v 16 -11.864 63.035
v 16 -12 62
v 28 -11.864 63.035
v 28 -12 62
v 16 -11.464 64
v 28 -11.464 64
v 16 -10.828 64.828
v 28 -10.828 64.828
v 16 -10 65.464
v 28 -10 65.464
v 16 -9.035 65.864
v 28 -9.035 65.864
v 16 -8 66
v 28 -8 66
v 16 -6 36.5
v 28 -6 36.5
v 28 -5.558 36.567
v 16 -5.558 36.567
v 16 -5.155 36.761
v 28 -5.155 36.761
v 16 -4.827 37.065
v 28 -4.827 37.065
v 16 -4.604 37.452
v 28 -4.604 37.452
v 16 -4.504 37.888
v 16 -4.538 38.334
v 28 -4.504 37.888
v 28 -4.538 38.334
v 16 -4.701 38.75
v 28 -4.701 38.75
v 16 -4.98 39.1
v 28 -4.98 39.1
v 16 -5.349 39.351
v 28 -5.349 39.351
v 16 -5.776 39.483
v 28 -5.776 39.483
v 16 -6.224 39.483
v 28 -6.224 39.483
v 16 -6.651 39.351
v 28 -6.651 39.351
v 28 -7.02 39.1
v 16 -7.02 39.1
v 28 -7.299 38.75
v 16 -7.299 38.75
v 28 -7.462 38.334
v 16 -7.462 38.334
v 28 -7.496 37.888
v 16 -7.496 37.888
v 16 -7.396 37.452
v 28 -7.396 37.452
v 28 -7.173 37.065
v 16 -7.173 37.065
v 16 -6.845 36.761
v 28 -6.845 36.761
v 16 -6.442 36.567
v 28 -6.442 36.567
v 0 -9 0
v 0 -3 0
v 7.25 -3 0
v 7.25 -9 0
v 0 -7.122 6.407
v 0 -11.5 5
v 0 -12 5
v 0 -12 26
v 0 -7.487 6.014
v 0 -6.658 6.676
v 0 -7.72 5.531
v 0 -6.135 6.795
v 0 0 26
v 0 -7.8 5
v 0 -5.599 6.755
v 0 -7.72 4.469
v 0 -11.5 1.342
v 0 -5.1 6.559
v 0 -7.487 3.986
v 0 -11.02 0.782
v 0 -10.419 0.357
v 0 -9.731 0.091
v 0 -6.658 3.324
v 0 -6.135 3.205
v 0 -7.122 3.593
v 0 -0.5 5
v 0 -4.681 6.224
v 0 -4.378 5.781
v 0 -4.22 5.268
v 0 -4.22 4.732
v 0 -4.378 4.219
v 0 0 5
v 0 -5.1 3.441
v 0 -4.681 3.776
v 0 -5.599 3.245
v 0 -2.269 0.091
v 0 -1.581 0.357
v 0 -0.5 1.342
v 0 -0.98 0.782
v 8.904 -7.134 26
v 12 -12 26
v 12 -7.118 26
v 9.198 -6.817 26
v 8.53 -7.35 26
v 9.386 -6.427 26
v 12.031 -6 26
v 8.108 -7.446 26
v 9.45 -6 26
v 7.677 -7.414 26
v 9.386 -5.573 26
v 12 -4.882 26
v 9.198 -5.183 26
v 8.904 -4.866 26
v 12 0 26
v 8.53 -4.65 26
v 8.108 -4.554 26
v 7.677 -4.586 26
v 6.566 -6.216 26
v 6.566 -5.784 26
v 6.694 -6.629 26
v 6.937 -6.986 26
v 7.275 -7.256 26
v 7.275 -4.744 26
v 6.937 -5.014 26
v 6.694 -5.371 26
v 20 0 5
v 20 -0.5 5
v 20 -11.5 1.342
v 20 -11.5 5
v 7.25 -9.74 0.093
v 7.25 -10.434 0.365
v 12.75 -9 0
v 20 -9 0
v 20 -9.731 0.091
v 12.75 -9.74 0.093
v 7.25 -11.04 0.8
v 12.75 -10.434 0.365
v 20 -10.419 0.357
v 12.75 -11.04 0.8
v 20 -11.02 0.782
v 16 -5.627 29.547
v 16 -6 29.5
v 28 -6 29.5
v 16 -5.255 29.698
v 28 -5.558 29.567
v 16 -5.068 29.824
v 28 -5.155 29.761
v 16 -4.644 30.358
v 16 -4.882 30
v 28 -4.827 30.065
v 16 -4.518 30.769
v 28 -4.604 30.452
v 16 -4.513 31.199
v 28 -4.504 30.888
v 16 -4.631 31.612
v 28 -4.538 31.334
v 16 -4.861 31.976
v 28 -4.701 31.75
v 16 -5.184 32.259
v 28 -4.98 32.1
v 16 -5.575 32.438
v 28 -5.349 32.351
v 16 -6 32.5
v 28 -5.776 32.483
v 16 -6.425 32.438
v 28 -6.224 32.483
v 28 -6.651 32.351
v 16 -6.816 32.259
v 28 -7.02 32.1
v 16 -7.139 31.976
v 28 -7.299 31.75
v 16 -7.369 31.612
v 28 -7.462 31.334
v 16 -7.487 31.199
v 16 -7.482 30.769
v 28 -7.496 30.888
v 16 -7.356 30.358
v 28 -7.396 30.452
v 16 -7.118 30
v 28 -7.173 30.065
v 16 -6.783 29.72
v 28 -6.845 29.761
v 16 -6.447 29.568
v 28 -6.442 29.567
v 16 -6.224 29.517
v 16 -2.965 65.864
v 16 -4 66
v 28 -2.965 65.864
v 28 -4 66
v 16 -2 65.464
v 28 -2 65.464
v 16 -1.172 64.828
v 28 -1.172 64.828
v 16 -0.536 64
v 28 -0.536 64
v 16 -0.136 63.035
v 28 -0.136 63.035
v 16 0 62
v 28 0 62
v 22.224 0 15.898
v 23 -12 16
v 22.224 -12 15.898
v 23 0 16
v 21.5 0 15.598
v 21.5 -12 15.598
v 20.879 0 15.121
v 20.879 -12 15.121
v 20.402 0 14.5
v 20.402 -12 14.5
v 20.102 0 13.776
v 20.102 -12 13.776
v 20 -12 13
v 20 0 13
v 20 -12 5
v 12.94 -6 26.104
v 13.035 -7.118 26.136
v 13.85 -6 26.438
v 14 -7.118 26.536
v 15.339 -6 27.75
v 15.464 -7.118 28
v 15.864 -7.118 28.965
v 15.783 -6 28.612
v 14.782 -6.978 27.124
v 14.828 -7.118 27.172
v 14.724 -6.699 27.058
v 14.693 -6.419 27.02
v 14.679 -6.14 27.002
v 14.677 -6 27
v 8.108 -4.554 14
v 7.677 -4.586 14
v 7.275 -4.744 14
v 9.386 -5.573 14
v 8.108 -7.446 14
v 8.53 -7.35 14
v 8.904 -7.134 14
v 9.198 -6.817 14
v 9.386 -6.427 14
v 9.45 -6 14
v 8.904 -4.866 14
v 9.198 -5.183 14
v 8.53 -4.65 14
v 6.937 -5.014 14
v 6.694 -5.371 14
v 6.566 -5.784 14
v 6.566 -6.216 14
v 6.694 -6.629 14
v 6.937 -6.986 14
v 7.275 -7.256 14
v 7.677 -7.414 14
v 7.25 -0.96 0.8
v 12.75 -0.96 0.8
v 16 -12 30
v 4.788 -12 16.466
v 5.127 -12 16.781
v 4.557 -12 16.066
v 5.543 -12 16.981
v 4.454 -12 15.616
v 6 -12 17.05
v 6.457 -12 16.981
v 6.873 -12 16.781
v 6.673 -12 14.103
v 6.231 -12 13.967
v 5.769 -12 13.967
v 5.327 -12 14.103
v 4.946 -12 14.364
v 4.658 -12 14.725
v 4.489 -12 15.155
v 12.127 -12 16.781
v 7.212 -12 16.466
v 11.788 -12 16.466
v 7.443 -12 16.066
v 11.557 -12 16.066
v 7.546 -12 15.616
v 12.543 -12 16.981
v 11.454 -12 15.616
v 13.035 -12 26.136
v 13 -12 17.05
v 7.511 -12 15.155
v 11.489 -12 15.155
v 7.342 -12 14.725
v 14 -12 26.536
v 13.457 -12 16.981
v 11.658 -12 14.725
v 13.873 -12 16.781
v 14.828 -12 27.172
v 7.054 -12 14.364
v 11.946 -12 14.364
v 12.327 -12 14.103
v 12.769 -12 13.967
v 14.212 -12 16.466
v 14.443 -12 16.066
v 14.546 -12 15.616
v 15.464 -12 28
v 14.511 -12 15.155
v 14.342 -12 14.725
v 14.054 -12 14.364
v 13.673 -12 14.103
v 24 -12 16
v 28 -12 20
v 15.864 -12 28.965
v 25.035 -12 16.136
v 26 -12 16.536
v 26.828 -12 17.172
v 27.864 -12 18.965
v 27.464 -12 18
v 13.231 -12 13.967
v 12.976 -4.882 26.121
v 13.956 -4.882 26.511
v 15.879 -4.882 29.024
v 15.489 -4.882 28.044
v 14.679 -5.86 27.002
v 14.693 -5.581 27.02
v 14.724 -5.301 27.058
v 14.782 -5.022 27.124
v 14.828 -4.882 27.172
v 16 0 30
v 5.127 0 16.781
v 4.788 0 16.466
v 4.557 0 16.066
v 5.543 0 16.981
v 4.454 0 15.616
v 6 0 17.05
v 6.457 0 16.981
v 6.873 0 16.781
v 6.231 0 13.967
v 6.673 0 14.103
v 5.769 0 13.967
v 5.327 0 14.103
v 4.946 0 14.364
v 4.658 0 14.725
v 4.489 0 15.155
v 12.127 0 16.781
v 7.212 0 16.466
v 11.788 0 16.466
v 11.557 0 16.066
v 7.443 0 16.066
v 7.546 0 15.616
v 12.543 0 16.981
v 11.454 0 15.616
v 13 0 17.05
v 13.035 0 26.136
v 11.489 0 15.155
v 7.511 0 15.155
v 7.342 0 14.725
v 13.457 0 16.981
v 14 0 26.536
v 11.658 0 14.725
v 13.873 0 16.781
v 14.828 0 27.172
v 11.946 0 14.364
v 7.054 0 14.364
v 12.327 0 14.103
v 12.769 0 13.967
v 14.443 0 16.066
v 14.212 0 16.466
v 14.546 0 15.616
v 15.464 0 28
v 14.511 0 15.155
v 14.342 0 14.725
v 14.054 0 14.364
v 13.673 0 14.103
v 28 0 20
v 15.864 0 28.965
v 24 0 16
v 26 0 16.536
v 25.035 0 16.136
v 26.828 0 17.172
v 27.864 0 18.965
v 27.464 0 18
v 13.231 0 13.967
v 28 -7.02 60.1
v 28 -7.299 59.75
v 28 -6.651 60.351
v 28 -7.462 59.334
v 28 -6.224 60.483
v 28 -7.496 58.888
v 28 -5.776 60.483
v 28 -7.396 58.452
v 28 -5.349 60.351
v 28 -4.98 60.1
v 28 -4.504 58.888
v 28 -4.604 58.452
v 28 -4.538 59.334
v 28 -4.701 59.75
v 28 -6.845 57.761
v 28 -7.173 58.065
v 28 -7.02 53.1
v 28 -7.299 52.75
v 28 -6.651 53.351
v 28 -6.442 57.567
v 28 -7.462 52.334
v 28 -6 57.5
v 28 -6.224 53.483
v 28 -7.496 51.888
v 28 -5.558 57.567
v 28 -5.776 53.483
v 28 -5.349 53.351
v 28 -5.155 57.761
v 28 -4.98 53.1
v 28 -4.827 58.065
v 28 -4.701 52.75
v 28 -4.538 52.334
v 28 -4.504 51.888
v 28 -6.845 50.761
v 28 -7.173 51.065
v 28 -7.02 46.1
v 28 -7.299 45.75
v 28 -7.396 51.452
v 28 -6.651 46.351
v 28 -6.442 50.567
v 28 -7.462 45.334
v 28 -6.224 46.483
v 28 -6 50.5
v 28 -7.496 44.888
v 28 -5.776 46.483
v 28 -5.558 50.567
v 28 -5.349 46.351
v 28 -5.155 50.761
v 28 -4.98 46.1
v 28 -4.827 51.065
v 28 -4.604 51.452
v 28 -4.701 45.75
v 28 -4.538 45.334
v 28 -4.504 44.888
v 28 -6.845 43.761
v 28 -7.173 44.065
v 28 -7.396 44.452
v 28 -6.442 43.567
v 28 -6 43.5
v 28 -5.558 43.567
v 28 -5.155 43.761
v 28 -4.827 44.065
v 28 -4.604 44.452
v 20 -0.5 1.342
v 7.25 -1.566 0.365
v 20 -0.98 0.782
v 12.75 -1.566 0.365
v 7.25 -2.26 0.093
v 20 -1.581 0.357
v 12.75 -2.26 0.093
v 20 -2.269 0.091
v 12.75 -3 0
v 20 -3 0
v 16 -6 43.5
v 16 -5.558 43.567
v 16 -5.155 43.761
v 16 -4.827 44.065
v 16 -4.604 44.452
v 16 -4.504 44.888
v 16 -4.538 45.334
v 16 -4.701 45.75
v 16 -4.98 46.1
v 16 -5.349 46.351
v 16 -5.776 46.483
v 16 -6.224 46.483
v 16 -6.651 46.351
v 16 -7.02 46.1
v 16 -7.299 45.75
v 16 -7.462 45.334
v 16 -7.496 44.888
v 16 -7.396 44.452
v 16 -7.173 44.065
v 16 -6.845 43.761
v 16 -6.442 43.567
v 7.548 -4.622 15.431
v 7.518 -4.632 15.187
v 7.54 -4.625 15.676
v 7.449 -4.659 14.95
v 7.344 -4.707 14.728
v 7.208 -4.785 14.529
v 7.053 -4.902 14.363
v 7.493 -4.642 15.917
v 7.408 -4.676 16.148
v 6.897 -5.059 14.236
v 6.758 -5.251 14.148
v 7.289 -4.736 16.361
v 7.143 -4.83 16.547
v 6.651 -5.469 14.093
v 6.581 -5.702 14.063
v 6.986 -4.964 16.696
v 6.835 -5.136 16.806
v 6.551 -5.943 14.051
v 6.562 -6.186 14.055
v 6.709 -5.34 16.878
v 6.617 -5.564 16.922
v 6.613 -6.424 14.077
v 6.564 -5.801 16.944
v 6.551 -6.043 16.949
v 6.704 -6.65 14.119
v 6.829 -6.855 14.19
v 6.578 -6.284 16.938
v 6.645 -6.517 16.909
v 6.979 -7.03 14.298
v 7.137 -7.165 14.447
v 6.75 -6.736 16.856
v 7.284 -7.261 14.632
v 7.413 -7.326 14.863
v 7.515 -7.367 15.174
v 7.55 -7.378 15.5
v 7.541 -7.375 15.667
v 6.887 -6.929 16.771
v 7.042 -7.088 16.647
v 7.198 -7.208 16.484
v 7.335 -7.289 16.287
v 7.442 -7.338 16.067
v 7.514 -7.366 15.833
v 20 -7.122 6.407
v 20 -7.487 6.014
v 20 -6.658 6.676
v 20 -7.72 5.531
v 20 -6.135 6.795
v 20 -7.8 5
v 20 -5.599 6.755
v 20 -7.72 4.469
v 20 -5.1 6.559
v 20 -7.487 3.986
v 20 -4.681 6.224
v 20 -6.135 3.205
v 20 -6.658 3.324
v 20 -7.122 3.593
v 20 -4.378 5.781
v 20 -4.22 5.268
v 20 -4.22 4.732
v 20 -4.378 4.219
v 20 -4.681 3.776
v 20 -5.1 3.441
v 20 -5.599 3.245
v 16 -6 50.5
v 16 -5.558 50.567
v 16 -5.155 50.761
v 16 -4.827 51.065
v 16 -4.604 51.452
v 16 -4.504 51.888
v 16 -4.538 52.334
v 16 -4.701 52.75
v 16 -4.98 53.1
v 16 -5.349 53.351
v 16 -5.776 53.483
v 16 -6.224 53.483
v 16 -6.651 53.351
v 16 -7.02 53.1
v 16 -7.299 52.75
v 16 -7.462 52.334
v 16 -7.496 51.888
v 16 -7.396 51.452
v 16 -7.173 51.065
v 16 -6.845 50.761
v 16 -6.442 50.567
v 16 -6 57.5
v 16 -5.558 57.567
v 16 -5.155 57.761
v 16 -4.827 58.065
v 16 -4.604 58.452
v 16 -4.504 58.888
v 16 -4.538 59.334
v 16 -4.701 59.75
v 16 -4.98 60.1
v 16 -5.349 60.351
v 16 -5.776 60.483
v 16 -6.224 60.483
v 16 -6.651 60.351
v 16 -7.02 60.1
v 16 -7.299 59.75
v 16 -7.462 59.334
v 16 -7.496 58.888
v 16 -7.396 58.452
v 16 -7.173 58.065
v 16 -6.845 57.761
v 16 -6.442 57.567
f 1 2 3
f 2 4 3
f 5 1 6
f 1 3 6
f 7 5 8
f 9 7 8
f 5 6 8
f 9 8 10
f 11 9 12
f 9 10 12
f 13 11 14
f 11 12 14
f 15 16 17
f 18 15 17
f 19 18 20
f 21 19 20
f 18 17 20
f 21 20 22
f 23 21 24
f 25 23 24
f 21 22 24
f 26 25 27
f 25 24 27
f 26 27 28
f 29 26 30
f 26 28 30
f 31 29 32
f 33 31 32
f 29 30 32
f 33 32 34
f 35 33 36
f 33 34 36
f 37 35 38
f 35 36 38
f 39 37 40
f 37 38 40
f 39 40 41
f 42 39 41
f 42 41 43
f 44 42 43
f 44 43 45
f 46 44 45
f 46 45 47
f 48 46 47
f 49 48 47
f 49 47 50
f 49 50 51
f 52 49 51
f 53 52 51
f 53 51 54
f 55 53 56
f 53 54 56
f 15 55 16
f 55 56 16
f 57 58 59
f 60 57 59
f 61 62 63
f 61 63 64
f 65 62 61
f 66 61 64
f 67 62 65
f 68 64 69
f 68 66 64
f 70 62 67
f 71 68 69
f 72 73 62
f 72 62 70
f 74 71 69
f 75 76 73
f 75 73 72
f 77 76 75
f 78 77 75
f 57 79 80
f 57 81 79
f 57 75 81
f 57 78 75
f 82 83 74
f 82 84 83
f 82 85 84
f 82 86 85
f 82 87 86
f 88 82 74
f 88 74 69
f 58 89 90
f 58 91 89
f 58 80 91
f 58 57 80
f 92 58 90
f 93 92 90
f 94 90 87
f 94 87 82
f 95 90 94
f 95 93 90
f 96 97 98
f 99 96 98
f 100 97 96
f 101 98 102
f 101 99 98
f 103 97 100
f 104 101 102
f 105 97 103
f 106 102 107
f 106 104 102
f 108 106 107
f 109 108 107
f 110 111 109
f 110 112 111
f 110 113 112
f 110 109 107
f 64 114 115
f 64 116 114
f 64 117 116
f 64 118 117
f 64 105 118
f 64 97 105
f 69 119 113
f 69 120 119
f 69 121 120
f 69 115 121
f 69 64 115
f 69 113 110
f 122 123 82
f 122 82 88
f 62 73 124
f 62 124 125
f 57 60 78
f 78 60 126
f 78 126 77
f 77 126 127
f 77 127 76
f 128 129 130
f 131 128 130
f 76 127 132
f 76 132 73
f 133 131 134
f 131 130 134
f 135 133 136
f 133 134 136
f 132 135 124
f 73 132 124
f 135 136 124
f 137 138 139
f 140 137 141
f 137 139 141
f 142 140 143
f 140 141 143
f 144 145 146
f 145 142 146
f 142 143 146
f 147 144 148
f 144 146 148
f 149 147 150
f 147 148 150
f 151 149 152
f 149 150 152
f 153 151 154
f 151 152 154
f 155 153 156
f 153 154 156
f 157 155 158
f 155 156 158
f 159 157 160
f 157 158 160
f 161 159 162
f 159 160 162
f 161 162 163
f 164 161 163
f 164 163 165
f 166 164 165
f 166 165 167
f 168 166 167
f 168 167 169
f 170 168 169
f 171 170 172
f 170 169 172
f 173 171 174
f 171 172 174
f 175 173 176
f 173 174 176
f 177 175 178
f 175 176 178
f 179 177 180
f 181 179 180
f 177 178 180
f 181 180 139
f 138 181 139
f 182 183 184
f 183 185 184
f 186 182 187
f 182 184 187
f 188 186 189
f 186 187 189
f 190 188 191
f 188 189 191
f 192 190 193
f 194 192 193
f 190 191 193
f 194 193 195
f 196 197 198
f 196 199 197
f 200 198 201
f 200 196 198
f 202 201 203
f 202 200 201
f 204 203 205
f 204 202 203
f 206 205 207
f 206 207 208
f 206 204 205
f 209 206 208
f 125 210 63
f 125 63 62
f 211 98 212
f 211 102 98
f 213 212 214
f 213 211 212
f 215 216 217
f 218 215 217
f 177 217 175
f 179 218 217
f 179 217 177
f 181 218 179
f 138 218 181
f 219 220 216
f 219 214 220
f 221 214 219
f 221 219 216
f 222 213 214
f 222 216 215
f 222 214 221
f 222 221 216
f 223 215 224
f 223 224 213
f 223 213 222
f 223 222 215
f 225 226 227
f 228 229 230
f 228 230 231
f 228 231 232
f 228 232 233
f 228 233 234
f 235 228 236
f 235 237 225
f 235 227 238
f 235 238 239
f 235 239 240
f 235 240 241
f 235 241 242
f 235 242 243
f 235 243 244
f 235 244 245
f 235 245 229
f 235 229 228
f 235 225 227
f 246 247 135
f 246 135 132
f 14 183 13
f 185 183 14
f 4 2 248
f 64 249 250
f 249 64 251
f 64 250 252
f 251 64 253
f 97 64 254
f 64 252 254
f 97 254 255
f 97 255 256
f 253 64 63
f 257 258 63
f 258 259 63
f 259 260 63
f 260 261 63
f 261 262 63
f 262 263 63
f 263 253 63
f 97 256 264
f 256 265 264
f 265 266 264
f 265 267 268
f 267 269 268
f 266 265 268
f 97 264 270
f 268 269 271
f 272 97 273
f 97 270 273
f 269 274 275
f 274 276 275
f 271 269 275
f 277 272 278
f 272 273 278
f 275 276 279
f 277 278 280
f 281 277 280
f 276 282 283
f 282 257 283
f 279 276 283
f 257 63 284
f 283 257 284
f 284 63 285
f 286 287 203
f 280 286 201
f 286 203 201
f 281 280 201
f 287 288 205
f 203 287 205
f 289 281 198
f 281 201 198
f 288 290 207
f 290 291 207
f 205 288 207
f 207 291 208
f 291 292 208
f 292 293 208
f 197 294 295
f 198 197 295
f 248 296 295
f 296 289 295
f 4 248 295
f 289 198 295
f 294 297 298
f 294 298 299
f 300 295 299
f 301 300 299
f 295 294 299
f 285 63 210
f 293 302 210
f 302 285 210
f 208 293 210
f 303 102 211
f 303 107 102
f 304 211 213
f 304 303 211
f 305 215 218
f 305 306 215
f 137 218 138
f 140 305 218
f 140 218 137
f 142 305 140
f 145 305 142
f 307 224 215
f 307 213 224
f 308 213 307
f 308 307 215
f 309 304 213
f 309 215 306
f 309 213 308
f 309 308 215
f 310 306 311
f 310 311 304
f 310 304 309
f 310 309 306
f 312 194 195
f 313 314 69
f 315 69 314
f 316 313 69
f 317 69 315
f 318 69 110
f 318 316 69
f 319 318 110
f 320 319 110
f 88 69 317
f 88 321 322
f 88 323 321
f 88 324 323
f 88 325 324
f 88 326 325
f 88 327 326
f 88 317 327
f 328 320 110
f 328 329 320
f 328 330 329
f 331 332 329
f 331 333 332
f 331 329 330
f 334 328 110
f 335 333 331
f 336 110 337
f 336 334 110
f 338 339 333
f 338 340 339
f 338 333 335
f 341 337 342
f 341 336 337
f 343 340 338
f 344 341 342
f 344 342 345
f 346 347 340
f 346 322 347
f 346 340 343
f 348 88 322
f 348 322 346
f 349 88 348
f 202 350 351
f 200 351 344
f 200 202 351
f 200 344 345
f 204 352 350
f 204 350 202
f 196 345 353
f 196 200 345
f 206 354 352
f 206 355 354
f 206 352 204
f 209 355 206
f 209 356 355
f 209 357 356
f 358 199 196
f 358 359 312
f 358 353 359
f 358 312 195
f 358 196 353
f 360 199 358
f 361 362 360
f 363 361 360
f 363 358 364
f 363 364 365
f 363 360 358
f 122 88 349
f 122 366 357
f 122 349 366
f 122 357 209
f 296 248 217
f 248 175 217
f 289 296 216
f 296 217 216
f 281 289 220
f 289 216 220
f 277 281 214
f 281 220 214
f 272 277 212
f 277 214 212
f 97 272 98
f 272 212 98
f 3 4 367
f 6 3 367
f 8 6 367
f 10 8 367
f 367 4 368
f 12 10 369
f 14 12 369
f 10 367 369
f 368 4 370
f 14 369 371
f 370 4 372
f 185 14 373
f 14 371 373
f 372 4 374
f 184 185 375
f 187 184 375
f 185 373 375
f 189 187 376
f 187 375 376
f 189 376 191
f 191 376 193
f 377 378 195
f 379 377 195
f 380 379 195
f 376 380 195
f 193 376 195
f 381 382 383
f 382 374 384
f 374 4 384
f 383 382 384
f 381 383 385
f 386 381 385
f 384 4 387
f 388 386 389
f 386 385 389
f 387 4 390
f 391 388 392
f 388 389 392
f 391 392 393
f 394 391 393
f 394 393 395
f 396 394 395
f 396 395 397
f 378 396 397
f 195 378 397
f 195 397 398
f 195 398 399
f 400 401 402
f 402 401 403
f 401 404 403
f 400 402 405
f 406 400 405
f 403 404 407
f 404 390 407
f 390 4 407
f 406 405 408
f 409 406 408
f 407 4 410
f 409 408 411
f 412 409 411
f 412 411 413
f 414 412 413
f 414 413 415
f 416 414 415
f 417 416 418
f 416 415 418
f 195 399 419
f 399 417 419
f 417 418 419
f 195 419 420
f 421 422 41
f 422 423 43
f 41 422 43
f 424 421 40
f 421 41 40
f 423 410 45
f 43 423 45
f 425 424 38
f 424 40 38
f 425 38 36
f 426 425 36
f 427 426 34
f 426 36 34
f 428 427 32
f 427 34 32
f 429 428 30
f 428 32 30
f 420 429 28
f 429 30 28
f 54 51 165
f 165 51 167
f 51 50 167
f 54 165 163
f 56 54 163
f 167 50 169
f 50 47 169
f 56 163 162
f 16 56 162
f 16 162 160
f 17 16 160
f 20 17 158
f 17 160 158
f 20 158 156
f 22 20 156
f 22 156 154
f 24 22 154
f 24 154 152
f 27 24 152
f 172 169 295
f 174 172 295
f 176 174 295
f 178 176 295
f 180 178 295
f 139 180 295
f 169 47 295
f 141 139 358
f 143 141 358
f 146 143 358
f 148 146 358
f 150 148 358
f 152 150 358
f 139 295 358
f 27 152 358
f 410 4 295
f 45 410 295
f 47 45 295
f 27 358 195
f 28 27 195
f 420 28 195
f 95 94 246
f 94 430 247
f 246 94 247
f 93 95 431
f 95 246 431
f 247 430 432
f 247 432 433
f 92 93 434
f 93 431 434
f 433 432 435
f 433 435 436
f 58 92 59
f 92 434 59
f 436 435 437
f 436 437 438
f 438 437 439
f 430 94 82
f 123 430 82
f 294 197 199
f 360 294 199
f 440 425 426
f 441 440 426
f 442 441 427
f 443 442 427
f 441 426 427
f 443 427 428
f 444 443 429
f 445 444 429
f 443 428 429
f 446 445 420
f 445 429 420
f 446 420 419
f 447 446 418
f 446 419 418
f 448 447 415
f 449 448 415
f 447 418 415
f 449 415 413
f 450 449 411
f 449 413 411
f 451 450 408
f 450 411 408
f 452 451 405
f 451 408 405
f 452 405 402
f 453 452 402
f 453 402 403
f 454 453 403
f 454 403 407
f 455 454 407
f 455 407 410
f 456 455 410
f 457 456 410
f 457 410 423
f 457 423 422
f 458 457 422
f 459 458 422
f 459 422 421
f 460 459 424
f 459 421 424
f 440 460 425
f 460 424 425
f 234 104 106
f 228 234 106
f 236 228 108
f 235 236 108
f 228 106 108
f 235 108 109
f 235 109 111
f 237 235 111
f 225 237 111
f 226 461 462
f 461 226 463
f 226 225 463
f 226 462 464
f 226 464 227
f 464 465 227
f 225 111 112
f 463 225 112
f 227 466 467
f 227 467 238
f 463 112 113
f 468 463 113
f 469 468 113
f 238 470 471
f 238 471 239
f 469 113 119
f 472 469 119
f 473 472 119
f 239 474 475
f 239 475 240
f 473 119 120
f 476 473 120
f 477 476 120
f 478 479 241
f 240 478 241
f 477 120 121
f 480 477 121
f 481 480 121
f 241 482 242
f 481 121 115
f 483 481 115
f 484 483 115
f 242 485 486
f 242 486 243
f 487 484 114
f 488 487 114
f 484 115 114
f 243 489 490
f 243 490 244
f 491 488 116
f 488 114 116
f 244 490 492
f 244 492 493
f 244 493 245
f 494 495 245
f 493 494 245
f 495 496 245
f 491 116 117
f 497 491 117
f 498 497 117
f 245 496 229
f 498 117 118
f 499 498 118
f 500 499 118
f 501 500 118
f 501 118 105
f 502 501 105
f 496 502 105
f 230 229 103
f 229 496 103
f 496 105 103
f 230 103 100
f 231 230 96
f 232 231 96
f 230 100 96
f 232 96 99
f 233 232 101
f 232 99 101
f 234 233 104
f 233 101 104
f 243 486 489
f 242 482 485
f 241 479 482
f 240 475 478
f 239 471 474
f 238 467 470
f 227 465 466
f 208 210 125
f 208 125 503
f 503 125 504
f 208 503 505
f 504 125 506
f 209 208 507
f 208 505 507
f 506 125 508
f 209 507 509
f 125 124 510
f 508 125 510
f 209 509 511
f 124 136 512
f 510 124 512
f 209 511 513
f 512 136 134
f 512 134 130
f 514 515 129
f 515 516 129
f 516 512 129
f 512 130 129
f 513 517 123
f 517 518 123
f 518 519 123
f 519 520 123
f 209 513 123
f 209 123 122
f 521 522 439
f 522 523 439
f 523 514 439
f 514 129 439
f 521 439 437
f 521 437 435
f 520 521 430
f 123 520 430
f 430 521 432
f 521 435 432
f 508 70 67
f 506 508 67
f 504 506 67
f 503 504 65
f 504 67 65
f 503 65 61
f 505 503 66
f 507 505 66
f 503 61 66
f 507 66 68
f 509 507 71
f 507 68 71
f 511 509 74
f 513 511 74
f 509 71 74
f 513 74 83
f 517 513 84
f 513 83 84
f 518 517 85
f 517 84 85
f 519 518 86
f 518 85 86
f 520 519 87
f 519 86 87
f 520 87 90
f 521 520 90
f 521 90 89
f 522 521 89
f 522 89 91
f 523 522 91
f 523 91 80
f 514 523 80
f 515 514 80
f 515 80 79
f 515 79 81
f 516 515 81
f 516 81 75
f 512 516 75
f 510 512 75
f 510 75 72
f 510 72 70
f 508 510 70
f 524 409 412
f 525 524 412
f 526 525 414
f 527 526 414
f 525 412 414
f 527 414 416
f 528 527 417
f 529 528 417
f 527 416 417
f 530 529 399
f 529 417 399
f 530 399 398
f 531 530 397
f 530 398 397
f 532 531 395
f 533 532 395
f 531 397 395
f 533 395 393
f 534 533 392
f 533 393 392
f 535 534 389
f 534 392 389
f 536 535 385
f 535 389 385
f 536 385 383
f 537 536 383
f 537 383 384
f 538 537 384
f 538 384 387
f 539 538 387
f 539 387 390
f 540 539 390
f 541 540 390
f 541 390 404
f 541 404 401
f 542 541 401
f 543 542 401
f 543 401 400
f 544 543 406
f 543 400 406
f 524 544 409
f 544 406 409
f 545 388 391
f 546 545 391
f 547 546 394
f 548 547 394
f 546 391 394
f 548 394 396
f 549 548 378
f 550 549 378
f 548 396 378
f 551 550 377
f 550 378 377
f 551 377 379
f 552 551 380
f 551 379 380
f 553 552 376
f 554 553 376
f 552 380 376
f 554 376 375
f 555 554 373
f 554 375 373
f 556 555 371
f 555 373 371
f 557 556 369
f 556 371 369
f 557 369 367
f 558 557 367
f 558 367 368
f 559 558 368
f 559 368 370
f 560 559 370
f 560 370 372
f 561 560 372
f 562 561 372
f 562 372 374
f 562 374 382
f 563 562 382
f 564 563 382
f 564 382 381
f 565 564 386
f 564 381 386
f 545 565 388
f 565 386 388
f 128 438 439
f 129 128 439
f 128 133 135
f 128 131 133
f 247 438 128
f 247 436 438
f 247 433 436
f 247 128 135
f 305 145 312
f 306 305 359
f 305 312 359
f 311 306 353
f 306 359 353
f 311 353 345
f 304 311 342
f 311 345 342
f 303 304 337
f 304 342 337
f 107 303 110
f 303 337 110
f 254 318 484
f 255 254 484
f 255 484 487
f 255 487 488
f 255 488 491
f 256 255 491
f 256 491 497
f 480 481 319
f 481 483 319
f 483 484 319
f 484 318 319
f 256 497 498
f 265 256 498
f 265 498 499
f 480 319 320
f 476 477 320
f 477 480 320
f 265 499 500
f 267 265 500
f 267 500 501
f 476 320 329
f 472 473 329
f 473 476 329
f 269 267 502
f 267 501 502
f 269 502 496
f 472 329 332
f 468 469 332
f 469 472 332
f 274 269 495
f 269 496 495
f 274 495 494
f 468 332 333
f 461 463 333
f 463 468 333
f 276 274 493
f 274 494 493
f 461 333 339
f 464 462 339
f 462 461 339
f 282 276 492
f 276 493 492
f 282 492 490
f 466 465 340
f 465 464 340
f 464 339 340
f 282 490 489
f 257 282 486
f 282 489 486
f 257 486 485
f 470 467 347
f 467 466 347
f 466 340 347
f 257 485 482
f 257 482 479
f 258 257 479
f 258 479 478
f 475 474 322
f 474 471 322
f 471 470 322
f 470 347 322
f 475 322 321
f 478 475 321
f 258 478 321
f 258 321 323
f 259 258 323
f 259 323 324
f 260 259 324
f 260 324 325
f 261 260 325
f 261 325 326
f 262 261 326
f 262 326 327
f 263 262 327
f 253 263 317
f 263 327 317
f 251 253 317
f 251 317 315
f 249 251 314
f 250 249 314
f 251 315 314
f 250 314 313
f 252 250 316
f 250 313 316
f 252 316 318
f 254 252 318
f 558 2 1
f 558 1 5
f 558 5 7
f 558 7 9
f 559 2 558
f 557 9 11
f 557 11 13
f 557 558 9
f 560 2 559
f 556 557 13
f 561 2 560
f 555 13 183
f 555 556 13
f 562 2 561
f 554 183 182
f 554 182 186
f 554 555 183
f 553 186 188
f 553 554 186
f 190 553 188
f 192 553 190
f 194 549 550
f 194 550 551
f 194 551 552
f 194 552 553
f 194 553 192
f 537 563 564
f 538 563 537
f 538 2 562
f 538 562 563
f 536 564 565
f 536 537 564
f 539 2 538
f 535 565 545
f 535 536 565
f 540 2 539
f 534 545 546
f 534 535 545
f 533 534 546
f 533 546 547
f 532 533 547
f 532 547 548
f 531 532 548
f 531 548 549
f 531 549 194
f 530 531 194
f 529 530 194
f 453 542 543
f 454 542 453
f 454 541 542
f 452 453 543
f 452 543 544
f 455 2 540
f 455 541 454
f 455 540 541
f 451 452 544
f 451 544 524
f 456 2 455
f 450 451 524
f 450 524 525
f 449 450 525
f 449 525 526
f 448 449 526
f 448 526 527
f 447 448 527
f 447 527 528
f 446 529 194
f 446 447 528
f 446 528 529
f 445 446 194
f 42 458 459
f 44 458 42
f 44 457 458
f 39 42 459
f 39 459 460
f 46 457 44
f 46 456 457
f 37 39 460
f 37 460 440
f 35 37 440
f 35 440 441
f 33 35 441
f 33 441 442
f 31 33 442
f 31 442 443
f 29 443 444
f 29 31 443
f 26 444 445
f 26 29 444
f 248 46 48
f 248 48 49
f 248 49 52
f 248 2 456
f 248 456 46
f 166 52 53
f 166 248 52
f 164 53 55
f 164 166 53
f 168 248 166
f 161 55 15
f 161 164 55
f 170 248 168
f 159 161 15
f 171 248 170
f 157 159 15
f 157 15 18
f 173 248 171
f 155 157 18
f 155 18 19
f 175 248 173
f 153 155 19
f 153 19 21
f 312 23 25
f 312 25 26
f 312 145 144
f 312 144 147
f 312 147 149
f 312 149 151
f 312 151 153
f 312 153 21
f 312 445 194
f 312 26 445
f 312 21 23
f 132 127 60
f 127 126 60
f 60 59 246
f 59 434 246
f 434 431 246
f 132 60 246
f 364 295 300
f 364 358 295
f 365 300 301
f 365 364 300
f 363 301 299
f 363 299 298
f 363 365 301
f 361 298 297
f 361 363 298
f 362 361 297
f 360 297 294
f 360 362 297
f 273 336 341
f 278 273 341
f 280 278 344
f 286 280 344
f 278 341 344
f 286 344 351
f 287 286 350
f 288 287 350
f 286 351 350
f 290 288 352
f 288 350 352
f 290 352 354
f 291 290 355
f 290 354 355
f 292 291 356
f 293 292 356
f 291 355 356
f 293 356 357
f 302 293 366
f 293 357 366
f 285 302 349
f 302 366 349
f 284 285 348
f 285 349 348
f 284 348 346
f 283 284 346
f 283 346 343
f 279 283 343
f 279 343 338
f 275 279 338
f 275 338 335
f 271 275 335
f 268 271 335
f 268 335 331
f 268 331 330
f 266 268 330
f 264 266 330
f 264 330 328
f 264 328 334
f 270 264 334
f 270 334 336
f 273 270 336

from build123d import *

# Parameters (mm, degrees)
SKETCH1_W           = 20
SKETCH1_H           = 12
BOSS_EXTRUDE1_DEPTH = 26
SKETCH2_W           = 10
SKETCH2_H           = 12
BOSS_EXTRUDE2_DEPTH = 8
SKETCH4_R           = 1.55
CUT_EXTRUDE2_DEPTH  = 41.049968789
FILLET1_R           = 3
FILLET3_R           = 3
SKETCH5_W           = 9.976745634
SKETCH5_H           = 0.5
SKETCH5_W_2         = 12.25993895
CUT_EXTRUDE3_DEPTH  = 41.049968789
SKETCH6_W           = 5.5
SKETCH6_H           = 30.488056323
CUT_EXTRUDE4_DEPTH  = 0.8
SKETCH8_W           = 12
SKETCH8_H           = 12
BOSS_EXTRUDE3_DEPTH = 40
SKETCH3_R           = 1.8
CUT_EXTRUDE1_DEPTH  = 73.691127382
SKETCH9_R           = 1.5
CUT_EXTRUDE6_DEPTH  = 12
FILLET4_R           = 4
SKETCH10_R          = 1.45
CUT_EXTRUDE7_DEPTH  = 12
FILLET5_R           = 4
FILLET7_R           = 4


with BuildPart() as part:
    # Sketch1 → Boss-Extrude1 (new body)
    with BuildSketch(Plane.XY):
        with Locations((10, -6)):
            Rectangle(SKETCH1_W, SKETCH1_H)
    extrude(amount=BOSS_EXTRUDE1_DEPTH)

    # Sketch2 → Boss-Extrude2 (add)
    with BuildSketch(Plane(origin=(20, 0, 0), x_dir=(0, 0, -1), z_dir=(1, 0, 0))):
        with Locations((-21, -6)):
            Rectangle(SKETCH2_W, SKETCH2_H)
    extrude(amount=BOSS_EXTRUDE2_DEPTH)

    # Sketch4 → Cut-Extrude2 (cut, through all)
    with BuildSketch(Plane(origin=(0, 0, 0), x_dir=(1, 0, 0), z_dir=(0, 1, 0))):
        with Locations(Location((13, -15.5, 0), (0, 0, 270))):
            Circle(SKETCH4_R)
        with Locations(Location((6, -15.5, 0), (0, 0, 270))):
            Circle(SKETCH4_R)
    extrude(amount=-CUT_EXTRUDE2_DEPTH, mode=Mode.SUBTRACT)

    # Fillet1
    fillet1_edges = [part.edges().sort_by_distance(p)[0] for p in [
        (20, -6, 16),
    ]]
    fillet(fillet1_edges, radius=FILLET1_R)

    # Fillet3
    fillet3_edges = [part.edges().sort_by_distance(p)[0] for p in [
        (10, 0, 0),
        (10, -12, 0),
    ]]
    fillet(fillet3_edges, radius=FILLET3_R)

    # Sketch5 → Cut-Extrude3 (cut, through all)
    with BuildSketch(Plane.ZY):
        with Locations((0.011627183, -11.75)):
            Rectangle(SKETCH5_W, SKETCH5_H)
        with Locations((-1.129969475, -0.25)):
            Rectangle(SKETCH5_W_2, SKETCH5_H)
    extrude(amount=-CUT_EXTRUDE3_DEPTH, mode=Mode.SUBTRACT)

    # Sketch6 → Cut-Extrude4 (cut)
    with BuildSketch(Plane(origin=(0, 0, 0), x_dir=(-1, 0, 0), z_dir=(0, 0, -1))):
        with Locations((-10, -7.868232937)):
            Rectangle(SKETCH6_W, SKETCH6_H)
    extrude(amount=-CUT_EXTRUDE4_DEPTH, mode=Mode.SUBTRACT)

    # Sketch8 → Boss-Extrude3 (add)
    with BuildSketch(Plane.XY.offset(26)):
        with Locations((22, -6)):
            Rectangle(SKETCH8_W, SKETCH8_H)
    extrude(amount=BOSS_EXTRUDE3_DEPTH)

    # Sketch3 → Cut-Extrude1 (cut, through all)
    with BuildSketch(Plane.ZY):
        with Locations(Location((5, -6, 0), (0, 0, 270))):
            Circle(SKETCH3_R)
    extrude(amount=-CUT_EXTRUDE1_DEPTH, mode=Mode.SUBTRACT)

    # Sketch9 → Cut-Extrude6 (cut)
    with BuildSketch(Plane(origin=(28, 0, 0), x_dir=(0, 0, -1), z_dir=(1, 0, 0))):
        with Locations((-31, -6)):
            Circle(SKETCH9_R)
        with Locations((-38, -6)):
            Circle(SKETCH9_R)
        with Locations((-45, -6)):
            Circle(SKETCH9_R)
        with Locations((-52, -6)):
            Circle(SKETCH9_R)
        with Locations((-59, -6)):
            Circle(SKETCH9_R)
    extrude(amount=-CUT_EXTRUDE6_DEPTH, mode=Mode.SUBTRACT)

    # Fillet4
    fillet4_edges = [part.edges().sort_by_distance(p)[0] for p in [
        (16, -6, 26),
    ]]
    fillet(fillet4_edges, radius=FILLET4_R)

    # Sketch10 → Cut-Extrude7 (cut)
    with BuildSketch(Plane.XY.offset(26)):
        with Locations((8, -6)):
            Circle(SKETCH10_R)
    extrude(amount=-CUT_EXTRUDE7_DEPTH, mode=Mode.SUBTRACT)

    # Fillet5
    fillet5_edges = [part.edges().sort_by_distance(p)[0] for p in [
        (28, -6, 16),
    ]]
    fillet(fillet5_edges, radius=FILLET5_R)

    # Fillet7
    fillet7_edges = [part.edges().sort_by_distance(p)[0] for p in [
        (22, 0, 66),
        (22, -12, 66),
    ]]
    fillet(fillet7_edges, radius=FILLET7_R)


solid = part.part
